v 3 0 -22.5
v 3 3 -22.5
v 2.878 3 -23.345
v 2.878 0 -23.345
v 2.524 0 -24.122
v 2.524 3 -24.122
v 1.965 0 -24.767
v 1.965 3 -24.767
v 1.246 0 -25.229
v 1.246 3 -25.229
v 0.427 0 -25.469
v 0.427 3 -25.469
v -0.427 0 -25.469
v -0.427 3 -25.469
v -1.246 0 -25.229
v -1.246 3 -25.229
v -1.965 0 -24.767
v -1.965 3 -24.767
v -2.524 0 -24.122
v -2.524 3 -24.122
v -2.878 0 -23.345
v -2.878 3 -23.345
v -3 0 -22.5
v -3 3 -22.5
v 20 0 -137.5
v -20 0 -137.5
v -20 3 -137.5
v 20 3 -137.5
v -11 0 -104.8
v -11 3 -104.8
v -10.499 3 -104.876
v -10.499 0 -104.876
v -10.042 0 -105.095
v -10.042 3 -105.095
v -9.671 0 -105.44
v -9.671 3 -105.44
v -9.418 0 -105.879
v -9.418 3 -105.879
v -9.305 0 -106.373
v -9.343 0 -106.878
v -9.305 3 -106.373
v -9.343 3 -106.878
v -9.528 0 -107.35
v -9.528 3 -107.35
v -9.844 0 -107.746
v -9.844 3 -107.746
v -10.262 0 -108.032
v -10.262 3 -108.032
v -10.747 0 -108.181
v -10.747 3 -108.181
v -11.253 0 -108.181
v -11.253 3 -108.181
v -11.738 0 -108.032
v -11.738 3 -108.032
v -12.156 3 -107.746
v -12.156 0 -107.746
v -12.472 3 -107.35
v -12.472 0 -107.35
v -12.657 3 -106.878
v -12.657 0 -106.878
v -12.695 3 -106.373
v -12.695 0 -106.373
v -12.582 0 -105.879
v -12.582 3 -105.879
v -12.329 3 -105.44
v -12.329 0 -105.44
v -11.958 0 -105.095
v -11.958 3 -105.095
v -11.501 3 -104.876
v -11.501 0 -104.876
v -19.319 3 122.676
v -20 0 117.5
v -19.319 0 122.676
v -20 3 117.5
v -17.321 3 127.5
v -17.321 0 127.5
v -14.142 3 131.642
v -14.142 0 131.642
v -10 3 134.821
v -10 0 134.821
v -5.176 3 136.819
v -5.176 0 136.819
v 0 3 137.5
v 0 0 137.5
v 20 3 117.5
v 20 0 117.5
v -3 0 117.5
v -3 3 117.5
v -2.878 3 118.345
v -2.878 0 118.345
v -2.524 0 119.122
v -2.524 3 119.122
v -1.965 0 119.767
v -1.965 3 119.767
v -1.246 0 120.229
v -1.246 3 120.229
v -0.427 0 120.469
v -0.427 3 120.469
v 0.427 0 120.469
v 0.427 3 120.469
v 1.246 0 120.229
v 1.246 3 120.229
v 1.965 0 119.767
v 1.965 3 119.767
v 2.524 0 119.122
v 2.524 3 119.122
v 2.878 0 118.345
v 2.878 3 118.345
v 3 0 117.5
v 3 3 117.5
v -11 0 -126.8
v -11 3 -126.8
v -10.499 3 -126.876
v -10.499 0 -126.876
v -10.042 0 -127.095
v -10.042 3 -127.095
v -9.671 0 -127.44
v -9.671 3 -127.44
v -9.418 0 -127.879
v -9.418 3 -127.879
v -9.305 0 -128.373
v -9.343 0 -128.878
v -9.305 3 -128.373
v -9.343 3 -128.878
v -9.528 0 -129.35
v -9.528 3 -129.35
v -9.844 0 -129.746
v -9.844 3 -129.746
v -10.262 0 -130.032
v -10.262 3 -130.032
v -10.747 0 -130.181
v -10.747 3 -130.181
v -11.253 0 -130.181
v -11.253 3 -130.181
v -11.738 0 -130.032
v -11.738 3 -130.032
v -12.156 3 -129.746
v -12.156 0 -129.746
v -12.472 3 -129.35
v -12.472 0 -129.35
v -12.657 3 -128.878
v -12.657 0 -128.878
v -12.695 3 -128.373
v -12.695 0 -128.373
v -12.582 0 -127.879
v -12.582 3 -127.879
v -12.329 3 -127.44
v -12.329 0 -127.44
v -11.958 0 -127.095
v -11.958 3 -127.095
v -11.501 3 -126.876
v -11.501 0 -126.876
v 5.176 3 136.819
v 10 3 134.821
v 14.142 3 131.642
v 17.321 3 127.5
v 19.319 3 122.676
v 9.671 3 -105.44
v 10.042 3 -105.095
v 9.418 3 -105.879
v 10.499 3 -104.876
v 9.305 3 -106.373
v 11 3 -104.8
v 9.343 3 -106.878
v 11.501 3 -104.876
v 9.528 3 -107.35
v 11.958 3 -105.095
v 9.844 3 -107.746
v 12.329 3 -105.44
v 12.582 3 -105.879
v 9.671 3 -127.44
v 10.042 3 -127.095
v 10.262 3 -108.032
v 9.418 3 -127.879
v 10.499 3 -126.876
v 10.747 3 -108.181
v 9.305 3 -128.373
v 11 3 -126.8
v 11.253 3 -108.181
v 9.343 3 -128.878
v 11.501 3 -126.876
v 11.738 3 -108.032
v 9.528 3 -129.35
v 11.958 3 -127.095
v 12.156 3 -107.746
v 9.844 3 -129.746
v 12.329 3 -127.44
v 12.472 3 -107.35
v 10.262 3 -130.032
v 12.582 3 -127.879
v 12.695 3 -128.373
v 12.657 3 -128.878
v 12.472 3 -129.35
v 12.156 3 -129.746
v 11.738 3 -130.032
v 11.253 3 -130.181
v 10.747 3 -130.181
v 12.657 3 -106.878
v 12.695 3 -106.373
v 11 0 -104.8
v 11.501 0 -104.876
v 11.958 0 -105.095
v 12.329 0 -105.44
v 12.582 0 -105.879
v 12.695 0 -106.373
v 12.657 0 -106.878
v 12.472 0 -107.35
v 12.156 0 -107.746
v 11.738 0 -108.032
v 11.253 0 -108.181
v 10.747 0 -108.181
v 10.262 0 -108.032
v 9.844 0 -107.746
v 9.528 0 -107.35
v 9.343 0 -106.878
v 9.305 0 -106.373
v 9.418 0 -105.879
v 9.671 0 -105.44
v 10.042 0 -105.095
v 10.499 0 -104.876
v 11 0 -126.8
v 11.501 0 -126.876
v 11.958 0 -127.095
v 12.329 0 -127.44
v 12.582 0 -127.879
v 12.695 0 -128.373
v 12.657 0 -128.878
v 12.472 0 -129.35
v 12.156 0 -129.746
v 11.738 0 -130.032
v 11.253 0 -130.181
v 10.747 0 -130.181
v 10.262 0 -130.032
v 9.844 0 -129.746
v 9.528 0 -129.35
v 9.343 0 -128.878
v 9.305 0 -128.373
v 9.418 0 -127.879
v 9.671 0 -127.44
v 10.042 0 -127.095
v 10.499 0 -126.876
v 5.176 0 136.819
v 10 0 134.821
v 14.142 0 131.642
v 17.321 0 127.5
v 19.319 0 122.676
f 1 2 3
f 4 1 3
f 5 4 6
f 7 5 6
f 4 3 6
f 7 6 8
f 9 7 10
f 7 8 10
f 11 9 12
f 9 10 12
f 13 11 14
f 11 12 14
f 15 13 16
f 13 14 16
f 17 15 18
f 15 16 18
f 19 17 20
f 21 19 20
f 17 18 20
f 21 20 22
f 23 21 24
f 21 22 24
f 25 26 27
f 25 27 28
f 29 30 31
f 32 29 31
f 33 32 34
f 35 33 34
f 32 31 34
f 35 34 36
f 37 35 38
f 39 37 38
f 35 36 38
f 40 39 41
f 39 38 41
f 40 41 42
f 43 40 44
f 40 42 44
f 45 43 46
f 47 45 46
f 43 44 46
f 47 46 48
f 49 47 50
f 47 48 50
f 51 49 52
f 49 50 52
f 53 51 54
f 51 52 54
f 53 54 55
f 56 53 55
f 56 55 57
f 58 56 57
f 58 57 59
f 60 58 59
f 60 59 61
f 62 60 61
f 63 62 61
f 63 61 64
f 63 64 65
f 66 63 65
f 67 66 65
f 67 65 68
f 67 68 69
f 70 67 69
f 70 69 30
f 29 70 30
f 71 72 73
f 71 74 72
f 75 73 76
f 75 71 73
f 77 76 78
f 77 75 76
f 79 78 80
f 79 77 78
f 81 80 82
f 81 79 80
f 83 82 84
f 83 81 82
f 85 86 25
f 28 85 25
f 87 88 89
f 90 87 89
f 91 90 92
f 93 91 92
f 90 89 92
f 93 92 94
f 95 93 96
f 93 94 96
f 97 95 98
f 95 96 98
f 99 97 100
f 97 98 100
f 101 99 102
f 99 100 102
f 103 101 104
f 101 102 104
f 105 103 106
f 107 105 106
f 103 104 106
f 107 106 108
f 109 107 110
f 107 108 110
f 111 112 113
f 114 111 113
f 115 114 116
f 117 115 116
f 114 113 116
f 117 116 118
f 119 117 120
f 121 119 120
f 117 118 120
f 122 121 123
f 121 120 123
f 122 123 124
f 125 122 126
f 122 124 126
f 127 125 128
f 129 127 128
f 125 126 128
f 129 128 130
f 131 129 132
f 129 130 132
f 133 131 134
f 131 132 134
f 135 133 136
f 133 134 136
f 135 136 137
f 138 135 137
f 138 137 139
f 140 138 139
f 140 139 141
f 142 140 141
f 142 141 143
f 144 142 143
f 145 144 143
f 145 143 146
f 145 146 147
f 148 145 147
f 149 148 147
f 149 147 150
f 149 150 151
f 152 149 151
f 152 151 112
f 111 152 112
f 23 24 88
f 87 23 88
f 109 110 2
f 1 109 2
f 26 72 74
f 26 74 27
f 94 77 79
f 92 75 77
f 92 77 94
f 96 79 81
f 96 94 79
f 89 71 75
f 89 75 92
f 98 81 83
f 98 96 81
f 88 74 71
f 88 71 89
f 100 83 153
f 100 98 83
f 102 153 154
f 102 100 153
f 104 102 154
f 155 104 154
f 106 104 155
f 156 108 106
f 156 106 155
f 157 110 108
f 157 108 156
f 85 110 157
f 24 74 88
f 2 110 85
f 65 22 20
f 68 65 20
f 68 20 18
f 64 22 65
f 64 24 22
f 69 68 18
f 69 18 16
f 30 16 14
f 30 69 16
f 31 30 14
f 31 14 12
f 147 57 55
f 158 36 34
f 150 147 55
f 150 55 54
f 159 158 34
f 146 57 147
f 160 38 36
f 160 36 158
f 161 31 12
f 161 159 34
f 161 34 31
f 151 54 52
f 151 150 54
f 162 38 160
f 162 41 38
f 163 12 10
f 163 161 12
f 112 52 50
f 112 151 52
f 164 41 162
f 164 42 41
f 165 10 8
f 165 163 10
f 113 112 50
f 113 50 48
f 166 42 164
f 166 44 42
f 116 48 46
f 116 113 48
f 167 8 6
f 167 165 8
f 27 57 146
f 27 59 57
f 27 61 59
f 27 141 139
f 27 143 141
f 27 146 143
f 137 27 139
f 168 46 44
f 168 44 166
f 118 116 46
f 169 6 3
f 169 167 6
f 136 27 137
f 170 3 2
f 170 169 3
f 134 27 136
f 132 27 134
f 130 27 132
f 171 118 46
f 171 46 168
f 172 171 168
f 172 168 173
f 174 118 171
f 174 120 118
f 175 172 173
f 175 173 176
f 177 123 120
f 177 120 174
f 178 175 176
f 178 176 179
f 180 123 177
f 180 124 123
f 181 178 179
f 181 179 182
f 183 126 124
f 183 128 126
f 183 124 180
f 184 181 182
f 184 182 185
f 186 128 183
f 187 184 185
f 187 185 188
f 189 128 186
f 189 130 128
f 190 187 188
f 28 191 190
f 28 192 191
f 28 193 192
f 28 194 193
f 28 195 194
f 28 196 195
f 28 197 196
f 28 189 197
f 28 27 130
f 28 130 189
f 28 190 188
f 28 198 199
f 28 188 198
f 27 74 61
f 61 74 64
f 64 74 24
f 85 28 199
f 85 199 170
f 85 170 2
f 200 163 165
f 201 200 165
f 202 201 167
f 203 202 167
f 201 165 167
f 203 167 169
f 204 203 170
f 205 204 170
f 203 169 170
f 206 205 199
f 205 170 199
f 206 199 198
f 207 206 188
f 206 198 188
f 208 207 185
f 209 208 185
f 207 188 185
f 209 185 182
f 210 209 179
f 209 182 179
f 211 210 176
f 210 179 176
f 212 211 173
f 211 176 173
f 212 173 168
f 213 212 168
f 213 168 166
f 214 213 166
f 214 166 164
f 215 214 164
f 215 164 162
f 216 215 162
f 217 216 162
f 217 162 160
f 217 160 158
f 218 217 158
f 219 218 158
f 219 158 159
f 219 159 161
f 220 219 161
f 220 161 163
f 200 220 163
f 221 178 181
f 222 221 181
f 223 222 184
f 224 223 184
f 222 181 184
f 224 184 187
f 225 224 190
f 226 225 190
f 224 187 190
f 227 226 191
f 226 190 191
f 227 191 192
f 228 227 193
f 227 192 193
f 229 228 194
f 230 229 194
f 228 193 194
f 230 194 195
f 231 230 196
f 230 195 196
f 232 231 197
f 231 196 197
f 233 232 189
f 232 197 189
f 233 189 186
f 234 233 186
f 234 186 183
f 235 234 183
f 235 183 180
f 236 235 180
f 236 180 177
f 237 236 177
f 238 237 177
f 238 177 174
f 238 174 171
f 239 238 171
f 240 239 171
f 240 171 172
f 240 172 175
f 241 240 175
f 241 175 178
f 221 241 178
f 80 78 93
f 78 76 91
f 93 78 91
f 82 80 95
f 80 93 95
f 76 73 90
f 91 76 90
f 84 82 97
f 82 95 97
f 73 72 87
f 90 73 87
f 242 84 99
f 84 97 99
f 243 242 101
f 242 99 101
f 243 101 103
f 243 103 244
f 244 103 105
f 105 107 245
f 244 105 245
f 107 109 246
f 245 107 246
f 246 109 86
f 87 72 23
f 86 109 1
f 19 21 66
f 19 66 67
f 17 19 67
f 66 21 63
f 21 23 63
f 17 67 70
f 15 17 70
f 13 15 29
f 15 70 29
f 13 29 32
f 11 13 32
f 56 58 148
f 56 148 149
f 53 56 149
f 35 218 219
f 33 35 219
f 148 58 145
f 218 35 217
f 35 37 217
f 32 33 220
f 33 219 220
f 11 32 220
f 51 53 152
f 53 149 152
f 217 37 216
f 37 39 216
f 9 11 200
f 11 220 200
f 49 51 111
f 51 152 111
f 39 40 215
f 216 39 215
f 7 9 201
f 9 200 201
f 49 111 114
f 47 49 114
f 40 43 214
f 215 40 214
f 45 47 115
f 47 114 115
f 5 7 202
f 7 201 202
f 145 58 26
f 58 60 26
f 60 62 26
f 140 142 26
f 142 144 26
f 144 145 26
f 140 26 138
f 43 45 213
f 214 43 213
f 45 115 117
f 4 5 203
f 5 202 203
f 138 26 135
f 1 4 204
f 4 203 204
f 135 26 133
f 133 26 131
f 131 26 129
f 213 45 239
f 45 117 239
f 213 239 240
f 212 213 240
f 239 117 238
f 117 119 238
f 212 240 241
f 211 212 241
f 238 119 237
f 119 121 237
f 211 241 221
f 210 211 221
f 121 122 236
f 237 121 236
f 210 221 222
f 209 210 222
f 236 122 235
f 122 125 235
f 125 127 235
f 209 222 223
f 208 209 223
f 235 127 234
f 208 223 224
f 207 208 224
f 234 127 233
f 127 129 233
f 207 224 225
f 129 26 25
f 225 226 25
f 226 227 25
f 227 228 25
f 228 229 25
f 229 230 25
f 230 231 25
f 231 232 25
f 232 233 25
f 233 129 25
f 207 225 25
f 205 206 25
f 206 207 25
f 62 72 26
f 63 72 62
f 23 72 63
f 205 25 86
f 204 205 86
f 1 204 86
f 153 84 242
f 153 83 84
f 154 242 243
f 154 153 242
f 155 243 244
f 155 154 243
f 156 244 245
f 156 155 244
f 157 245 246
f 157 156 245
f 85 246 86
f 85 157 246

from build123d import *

# Parameters (mm, degrees)
SKETCH1_W           = 40
SKETCH1_H           = 275
BOSS_EXTRUDE1_DEPTH = 3
SKETCH2_R           = 1.7
CUT_EXTRUDE1_DEPTH  = 139.979315008
FILLET1_R           = 20
CUT_EXTRUDE2_DEPTH  = 139.979315008


with BuildPart() as part:
    # Sketch1 → Boss-Extrude1 (new body)
    with BuildSketch(Plane(origin=(0, 0, 0), x_dir=(1, 0, 0), z_dir=(0, 1, 0))):
        Rectangle(SKETCH1_W, SKETCH1_H)
    extrude(amount=BOSS_EXTRUDE1_DEPTH)

    # Sketch2 → Cut-Extrude1 (cut, through all)
    with BuildSketch(Plane(origin=(0, 3, 0), x_dir=(1, 0, 0), z_dir=(0, 1, 0))):
        with Locations(Location((-11, 128.5, 0), (0, 0, 270))):
            Circle(SKETCH2_R)
        with Locations(Location((-11, 106.5, 0), (0, 0, 270))):
            Circle(SKETCH2_R)
        with Locations(Location((11, 128.5, 0), (0, 0, 270))):
            Circle(SKETCH2_R)
        with Locations(Location((11, 106.5, 0), (0, 0, 270))):
            Circle(SKETCH2_R)
    extrude(amount=-CUT_EXTRUDE1_DEPTH, mode=Mode.SUBTRACT)

    # Fillet1
    fillet1_edges = [part.edges().sort_by_distance(p)[0] for p in [
        (-20, 1.5, 137.5),
        (20, 1.5, 137.5),
    ]]
    fillet(fillet1_edges, radius=FILLET1_R - 0.0001)  # a hair under: the kernel refuses the full size

    # Sketch3 → Cut-Extrude2 (cut, through all)
    with BuildSketch(Plane(origin=(0, 3, 0), x_dir=(1, 0, 0), z_dir=(0, 1, 0))):
        with BuildLine():
            Line((-3, 22.5), (-3, -117.5))
            ThreePointArc((-3, -117.5), (0, -120.5), (3, -117.5))
            Line((3, -117.5), (3, 22.5))
            ThreePointArc((3, 22.5), (0, 25.5), (-3, 22.5))
        make_face()
    extrude(amount=-CUT_EXTRUDE2_DEPTH, mode=Mode.SUBTRACT)


solid = part.part
